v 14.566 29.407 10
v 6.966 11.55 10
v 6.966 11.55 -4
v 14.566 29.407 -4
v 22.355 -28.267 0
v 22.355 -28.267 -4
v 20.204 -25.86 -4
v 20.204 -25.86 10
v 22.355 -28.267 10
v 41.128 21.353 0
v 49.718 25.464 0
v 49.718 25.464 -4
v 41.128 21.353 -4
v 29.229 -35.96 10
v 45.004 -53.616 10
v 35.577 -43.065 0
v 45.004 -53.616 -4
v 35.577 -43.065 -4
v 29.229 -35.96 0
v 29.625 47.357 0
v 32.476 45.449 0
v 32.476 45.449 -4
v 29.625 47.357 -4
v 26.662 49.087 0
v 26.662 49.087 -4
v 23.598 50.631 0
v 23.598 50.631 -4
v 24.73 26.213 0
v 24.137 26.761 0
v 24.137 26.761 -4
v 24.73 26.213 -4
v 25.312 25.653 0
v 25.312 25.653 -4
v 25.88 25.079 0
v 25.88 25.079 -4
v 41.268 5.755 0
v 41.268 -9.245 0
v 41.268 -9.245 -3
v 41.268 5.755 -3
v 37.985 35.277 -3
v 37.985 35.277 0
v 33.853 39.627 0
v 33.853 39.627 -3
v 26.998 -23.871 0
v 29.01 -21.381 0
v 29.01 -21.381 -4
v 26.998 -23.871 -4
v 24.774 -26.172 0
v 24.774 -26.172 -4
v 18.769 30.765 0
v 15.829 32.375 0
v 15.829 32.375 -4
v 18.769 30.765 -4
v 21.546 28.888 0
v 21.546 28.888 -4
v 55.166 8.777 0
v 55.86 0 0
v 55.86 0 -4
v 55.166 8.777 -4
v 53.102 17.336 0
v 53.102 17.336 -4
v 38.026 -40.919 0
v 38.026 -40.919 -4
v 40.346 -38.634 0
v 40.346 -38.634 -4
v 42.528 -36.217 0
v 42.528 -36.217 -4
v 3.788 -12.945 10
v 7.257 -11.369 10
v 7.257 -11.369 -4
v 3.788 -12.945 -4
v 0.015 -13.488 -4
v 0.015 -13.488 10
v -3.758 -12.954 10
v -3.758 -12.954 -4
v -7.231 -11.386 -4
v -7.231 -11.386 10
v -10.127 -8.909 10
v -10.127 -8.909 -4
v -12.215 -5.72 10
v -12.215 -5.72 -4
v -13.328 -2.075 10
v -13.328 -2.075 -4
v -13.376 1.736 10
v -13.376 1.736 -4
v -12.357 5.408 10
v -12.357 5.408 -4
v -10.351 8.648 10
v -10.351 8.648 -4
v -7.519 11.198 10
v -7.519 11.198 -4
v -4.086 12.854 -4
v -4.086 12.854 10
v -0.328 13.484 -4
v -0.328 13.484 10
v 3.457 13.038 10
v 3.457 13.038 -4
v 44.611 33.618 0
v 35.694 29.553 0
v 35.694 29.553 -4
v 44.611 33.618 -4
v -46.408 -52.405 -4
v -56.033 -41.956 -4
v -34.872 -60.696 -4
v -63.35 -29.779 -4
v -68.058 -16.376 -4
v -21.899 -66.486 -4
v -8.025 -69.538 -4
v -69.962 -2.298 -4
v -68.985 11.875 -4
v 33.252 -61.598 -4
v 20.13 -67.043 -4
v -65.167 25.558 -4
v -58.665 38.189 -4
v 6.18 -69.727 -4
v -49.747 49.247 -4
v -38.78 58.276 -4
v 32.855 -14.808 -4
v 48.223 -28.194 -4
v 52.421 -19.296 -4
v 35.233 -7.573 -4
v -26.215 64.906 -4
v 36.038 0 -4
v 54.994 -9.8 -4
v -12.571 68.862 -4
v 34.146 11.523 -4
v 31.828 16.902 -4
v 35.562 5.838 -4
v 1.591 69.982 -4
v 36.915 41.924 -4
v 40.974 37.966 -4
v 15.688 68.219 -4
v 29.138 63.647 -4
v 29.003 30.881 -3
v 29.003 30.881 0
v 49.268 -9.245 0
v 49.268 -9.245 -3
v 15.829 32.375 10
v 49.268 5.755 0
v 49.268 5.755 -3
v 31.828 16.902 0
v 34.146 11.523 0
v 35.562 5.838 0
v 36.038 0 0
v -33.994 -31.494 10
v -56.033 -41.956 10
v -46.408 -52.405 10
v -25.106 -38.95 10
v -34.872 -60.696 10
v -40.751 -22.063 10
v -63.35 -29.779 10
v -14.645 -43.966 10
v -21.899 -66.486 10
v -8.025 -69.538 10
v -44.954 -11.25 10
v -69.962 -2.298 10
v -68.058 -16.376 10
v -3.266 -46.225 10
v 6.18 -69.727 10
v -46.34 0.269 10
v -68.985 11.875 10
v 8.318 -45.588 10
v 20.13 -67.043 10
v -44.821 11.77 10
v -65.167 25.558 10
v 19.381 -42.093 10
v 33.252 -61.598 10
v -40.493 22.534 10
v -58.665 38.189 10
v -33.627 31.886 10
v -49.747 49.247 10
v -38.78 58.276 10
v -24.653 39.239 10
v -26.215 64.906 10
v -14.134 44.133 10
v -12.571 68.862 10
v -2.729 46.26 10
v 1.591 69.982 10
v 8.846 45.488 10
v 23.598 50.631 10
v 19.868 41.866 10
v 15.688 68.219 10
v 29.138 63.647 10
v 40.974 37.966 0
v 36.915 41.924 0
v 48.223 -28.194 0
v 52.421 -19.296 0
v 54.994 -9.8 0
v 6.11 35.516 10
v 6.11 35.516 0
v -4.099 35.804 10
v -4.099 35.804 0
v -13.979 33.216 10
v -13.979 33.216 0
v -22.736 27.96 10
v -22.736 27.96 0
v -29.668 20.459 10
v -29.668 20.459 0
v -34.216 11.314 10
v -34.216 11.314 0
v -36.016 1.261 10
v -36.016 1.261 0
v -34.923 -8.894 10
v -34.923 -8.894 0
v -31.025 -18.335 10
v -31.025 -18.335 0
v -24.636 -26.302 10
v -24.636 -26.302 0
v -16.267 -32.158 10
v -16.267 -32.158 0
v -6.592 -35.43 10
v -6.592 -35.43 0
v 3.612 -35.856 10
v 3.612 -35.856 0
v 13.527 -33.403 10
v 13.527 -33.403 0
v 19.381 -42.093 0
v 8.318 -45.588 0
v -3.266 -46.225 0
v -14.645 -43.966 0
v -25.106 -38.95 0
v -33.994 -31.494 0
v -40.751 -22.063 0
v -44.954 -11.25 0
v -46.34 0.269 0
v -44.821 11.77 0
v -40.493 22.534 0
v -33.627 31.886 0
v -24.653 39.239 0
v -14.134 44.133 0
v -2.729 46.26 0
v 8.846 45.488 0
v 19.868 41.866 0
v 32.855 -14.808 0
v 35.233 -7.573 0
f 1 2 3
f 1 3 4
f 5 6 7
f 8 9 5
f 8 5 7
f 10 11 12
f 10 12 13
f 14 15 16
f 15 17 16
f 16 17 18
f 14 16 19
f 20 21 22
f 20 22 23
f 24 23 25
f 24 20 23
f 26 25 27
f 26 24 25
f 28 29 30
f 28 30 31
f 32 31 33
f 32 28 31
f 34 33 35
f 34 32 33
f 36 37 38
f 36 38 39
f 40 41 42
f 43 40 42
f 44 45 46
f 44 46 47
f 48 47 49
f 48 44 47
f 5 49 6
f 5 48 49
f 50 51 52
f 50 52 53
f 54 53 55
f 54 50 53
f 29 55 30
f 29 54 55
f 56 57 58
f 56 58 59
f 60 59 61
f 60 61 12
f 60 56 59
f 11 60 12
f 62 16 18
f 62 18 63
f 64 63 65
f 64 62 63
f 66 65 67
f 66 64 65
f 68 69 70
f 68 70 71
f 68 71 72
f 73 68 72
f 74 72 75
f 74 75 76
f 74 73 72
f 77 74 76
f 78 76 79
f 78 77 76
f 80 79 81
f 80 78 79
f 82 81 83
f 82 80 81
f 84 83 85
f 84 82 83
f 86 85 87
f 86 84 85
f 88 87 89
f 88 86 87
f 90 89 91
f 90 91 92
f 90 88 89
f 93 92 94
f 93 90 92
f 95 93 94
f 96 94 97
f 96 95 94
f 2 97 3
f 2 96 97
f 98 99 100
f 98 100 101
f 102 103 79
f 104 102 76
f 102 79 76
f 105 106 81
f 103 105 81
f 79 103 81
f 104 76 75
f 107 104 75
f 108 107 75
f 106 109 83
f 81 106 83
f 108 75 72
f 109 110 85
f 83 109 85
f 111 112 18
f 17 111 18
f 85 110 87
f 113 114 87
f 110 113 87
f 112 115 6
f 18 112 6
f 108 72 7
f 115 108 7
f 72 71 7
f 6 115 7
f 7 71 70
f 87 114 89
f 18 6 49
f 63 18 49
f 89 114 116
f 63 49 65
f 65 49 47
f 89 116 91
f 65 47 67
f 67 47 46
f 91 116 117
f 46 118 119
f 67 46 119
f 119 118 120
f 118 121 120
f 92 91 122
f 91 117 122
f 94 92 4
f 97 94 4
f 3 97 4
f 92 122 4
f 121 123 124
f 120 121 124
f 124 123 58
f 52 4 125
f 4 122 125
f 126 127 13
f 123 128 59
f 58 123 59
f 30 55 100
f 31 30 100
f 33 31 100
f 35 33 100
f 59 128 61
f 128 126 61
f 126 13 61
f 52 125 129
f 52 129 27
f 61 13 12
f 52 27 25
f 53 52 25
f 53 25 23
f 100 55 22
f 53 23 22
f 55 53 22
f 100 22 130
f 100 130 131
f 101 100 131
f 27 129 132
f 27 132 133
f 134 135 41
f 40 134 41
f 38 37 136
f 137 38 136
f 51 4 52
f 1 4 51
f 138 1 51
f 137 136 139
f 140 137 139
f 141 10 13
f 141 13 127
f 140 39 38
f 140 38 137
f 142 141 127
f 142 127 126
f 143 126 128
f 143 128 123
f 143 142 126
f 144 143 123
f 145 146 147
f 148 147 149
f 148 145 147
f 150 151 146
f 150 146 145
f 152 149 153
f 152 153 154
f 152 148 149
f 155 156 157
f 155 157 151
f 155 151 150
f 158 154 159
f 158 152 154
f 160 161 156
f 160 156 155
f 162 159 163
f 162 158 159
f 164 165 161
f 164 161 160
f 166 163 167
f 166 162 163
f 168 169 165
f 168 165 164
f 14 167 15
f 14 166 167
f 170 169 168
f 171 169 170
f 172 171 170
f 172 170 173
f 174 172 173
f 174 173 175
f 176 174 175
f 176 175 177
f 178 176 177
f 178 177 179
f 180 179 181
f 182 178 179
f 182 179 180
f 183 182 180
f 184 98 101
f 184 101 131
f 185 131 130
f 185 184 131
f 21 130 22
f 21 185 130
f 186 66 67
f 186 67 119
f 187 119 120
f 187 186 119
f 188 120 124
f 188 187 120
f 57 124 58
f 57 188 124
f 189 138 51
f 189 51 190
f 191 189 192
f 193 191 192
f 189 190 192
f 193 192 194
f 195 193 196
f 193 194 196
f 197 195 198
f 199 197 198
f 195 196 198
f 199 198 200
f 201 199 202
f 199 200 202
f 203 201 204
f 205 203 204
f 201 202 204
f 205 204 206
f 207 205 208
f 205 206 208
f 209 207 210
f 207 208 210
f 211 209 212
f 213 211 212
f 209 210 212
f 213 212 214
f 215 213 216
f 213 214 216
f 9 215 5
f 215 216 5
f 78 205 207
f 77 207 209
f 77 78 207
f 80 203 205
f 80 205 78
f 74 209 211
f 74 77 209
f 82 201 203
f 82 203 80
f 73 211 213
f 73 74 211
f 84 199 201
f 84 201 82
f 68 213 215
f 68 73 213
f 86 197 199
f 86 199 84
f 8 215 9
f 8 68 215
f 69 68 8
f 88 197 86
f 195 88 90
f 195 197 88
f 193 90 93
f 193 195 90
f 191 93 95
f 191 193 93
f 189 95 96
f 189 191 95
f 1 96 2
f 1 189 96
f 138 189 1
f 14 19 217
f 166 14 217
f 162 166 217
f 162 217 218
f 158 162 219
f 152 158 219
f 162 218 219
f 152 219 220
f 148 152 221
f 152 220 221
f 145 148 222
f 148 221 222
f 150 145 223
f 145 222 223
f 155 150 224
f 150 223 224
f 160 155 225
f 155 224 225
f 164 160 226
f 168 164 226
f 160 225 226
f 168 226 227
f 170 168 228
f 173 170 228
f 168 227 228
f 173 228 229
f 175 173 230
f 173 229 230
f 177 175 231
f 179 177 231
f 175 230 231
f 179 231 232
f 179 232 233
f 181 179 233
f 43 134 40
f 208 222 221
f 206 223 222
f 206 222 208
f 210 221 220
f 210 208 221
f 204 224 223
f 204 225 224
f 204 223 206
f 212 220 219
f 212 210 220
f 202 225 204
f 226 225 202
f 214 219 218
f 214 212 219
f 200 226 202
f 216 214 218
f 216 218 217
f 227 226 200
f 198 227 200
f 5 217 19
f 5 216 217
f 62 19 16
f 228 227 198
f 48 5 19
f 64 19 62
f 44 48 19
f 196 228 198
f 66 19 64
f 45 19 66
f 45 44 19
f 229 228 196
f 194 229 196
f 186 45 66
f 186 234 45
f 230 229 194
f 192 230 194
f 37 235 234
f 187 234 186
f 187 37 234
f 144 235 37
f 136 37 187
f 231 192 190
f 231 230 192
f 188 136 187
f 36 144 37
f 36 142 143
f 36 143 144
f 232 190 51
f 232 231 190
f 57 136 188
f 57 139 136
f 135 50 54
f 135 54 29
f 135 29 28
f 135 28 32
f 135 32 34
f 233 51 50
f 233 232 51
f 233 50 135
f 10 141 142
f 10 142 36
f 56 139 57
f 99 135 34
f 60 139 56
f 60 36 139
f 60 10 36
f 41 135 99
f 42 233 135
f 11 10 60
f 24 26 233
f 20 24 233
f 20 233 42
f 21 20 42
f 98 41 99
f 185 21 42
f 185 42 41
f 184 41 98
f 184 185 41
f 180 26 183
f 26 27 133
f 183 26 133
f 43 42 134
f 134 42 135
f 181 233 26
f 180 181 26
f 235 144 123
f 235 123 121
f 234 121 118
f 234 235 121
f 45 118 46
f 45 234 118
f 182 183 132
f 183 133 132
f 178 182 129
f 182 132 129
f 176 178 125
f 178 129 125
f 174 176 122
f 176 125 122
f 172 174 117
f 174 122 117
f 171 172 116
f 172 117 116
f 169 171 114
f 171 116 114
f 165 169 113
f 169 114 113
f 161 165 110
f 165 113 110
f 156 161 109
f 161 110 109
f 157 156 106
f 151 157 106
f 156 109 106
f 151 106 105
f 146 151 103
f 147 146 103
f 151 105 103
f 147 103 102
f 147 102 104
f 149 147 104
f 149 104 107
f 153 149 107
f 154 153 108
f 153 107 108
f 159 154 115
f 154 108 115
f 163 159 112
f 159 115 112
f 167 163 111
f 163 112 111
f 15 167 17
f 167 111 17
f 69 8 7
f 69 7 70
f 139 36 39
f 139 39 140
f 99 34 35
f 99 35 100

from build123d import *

# Parameters (mm, degrees)
F1_DEPTH = 4
F2_DEPTH = 10
F3_W     = 8
F3_H     = 15
F4_DEPTH = 3


with BuildPart() as f1:
    # F0 (on Top) → F1 (new body)
    with BuildSketch(Plane.XY):
        with BuildLine():
            Line((23.5981723771, 50.6307036507), (29.1379201291, 63.6473221004))
            ThreePointArc((29.1379201291, 63.6473221004), (-69.3679635531, -9.3853946369), (45.0035054679, -53.6160842994))
            Line((45.0035054679, -53.6160842994), (35.576841855, -43.0654178585))
            ThreePointArc((35.576841855, -43.0654178585), (-55.4090369327, -7.0838208542), (23.5981723771, 50.6307036507))
        make_face()
        with BuildLine():
            Line((19.8677907274, 41.8655113026), (23.5981723771, 50.6307036507))
            ThreePointArc((23.5981723771, 50.6307036507), (-55.4090369327, -7.0838208542), (35.576841855, -43.0654178585))
            Line((35.576841855, -43.0654178585), (29.2286049616, -35.9602391123))
            ThreePointArc((29.2286049616, -35.9602391123), (-46.0089760191, -5.5339200114), (19.8677907274, 41.8655113026))
        make_face()
        with BuildLine():
            Line((14.5657325798, 29.407386674), (15.8289323737, 32.3754983065))
            ThreePointArc((15.8289323737, 32.3754983065), (-35.8310083049, -3.8557534328), (22.3545915501, -28.266592071))
            Line((22.3545915501, -28.266592071), (20.2043653008, -25.8599802663))
            ThreePointArc((20.2043653008, -25.8599802663), (-32.6475173449, -3.3308509117), (14.5657325798, 29.407386674))
        make_face()
        with BuildLine():
            Line((6.9658582886, 11.5501360659), (14.5657325798, 29.407386674))
            ThreePointArc((14.5657325798, 29.407386674), (-32.6475173449, -3.3308509117), (20.2043653008, -25.8599802663))
            Line((20.2043653008, -25.8599802663), (7.257370403, -11.3692303905))
            ThreePointArc((7.257370403, -11.3692303905), (-13.4870085006, -0.1715416686), (6.9658582886, 11.5501360659))
        make_face()
        with BuildLine():
            Line((15.8289323737, 32.3754983065), (19.8677907274, 41.8655113026))
            ThreePointArc((19.8677907274, 41.8655113026), (-46.0089760191, -5.5339200114), (29.2286049616, -35.9602391123))
            Line((29.2286049616, -35.9602391123), (22.3545915501, -28.266592071))
            ThreePointArc((22.3545915501, -28.266592071), (-35.8310083049, -3.8557534328), (15.8289323737, 32.3754983065))
        make_face()
        with BuildLine():
            ThreePointArc((32.4763517935, 45.4491855361), (28.1567060881, 48.2446037809), (23.5981723771, 50.6307036507))
            Line((23.5981723771, 50.6307036507), (19.8677907274, 41.8655113026))
            ThreePointArc((19.8677907274, 41.8655113026), (24.3303762174, 39.4396112828), (28.5006543682, 36.5398802079))
            Line((28.5006543682, 36.5398802079), (32.4763517935, 45.4491855361))
        make_face()
        with BuildLine():
            ThreePointArc((28.5006543682, 36.5398802079), (24.3303762174, 39.4396112828), (19.8677907274, 41.8655113026))
            Line((19.8677907274, 41.8655113026), (15.8289323737, 32.3754983065))
            ThreePointArc((15.8289323737, 32.3754983065), (20.1791178088, 29.8585196408), (24.1368343884, 26.7608149426))
            Line((24.1368343884, 26.7608149426), (28.5006543682, 36.5398802079))
        make_face()
        with BuildLine():
            ThreePointArc((35.6941134, 29.5530102292), (32.2869345127, 33.2416005149), (28.5006543682, 36.5398802079))
            Line((28.5006543682, 36.5398802079), (24.1368343884, 26.7608149426))
            ThreePointArc((24.1368343884, 26.7608149426), (25.022522536, 25.9345591175), (25.8799433339, 25.0790056366))
            Line((25.8799433339, 25.0790056366), (35.6941134, 29.5530102292))
        make_face()
        with BuildLine():
            ThreePointArc((44.6112733376, 33.6180930885), (38.9951173125, 39.9965338185), (32.4763517935, 45.4491855361))
            Line((32.4763517935, 45.4491855361), (28.5006543682, 36.5398802079))
            ThreePointArc((28.5006543682, 36.5398802079), (32.2869345127, 33.2416005149), (35.6941134, 29.5530102292))
            Line((35.6941134, 29.5530102292), (44.6112733376, 33.6180930885))
        make_face()
        with BuildLine():
            Line((22.3545915501, -28.266592071), (29.2286049616, -35.9602391123))
            ThreePointArc((29.2286049616, -35.9602391123), (32.8206282453, -32.7147750505), (36.0544716862, -29.1122863487))
            Line((36.0544716862, -29.1122863487), (29.0097989093, -21.3812899032))
            ThreePointArc((29.0097989093, -21.3812899032), (25.9119084265, -25.0459775688), (22.3545915501, -28.266592071))
        make_face()
        with BuildLine():
            Line((29.2286049616, -35.9602391123), (35.576841855, -43.0654178585))
            ThreePointArc((35.576841855, -43.0654178585), (39.2024865114, -39.7933027409), (42.5284655631, -36.2170057923))
            Line((42.5284655631, -36.2170057923), (36.0544716862, -29.1122863487))
            ThreePointArc((36.0544716862, -29.1122863487), (32.8206282453, -32.7147750505), (29.2286049616, -35.9602391123))
        make_face()
        with BuildLine():
            Line((36.0544716862, -29.1122863487), (42.5284655631, -36.2170057923))
            ThreePointArc((42.5284655631, -36.2170057923), (52.4212879012, -19.2963848035), (55.860020513, 0))
            ThreePointArc((55.860020513, 0), (54.3029220862, 13.0971197067), (49.7184350628, 25.4640748234))
            Line((49.7184350628, 25.4640748234), (41.1278773135, 21.3529354587))
            ThreePointArc((41.1278773135, 21.3529354587), (45.0185527566, 10.9899978491), (46.3405885269, 0))
            ThreePointArc((46.3405885269, 0), (43.6934524957, -15.4380165186), (36.0544716862, -29.1122863487))
        make_face()
        with BuildLine():
            Line((29.0097989093, -21.3812899032), (36.0544716862, -29.1122863487))
            ThreePointArc((36.0544716862, -29.1122863487), (43.6934524957, -15.4380165186), (46.3405885269, 0))
            ThreePointArc((46.3405885269, 0), (45.0185527566, 10.9899978491), (41.1278773135, 21.3529354587))
            Line((41.1278773135, 21.3529354587), (31.8282165391, 16.9024442795))
            ThreePointArc((31.8282165391, 16.9024442795), (34.9696231307, 8.7093885424), (36.0378688421, 0))
            ThreePointArc((36.0378688421, 0), (34.2357950026, -11.253369772), (29.0097989093, -21.3812899032))
        make_face()
    extrude(amount=-F1_DEPTH)

    # F0 (on Top) → F2 (join)
    with BuildSketch(Plane.XY):
        with BuildLine():
            Line((23.5981723771, 50.6307036507), (29.1379201291, 63.6473221004))
            ThreePointArc((29.1379201291, 63.6473221004), (-69.3679635531, -9.3853946369), (45.0035054679, -53.6160842994))
            Line((45.0035054679, -53.6160842994), (35.576841855, -43.0654178585))
            ThreePointArc((35.576841855, -43.0654178585), (-55.4090369327, -7.0838208542), (23.5981723771, 50.6307036507))
        make_face()
        with BuildLine():
            Line((19.8677907274, 41.8655113026), (23.5981723771, 50.6307036507))
            ThreePointArc((23.5981723771, 50.6307036507), (-55.4090369327, -7.0838208542), (35.576841855, -43.0654178585))
            Line((35.576841855, -43.0654178585), (29.2286049616, -35.9602391123))
            ThreePointArc((29.2286049616, -35.9602391123), (-46.0089760191, -5.5339200114), (19.8677907274, 41.8655113026))
        make_face()
        with BuildLine():
            Line((6.9658582886, 11.5501360659), (14.5657325798, 29.407386674))
            ThreePointArc((14.5657325798, 29.407386674), (-32.6475173449, -3.3308509117), (20.2043653008, -25.8599802663))
            Line((20.2043653008, -25.8599802663), (7.257370403, -11.3692303905))
            ThreePointArc((7.257370403, -11.3692303905), (-13.4870085006, -0.1715416686), (6.9658582886, 11.5501360659))
        make_face()
        with BuildLine():
            Line((14.5657325798, 29.407386674), (15.8289323737, 32.3754983065))
            ThreePointArc((15.8289323737, 32.3754983065), (-35.8310083049, -3.8557534328), (22.3545915501, -28.266592071))
            Line((22.3545915501, -28.266592071), (20.2043653008, -25.8599802663))
            ThreePointArc((20.2043653008, -25.8599802663), (-32.6475173449, -3.3308509117), (14.5657325798, 29.407386674))
        make_face()
    extrude(amount=F2_DEPTH)

    # F3 (on face) → F4 (cut)
    with BuildSketch(Plane.XY):
        Polygon((37.9851715346, 35.276671204), (33.8525412993, 39.626541011), (29.0030042003, 30.8811427968), align=None)
        with Locations((45.2681102753, -1.745258756)):
            Rectangle(F3_W, F3_H)
    extrude(amount=-F4_DEPTH, mode=Mode.SUBTRACT)


solid = f1.part
